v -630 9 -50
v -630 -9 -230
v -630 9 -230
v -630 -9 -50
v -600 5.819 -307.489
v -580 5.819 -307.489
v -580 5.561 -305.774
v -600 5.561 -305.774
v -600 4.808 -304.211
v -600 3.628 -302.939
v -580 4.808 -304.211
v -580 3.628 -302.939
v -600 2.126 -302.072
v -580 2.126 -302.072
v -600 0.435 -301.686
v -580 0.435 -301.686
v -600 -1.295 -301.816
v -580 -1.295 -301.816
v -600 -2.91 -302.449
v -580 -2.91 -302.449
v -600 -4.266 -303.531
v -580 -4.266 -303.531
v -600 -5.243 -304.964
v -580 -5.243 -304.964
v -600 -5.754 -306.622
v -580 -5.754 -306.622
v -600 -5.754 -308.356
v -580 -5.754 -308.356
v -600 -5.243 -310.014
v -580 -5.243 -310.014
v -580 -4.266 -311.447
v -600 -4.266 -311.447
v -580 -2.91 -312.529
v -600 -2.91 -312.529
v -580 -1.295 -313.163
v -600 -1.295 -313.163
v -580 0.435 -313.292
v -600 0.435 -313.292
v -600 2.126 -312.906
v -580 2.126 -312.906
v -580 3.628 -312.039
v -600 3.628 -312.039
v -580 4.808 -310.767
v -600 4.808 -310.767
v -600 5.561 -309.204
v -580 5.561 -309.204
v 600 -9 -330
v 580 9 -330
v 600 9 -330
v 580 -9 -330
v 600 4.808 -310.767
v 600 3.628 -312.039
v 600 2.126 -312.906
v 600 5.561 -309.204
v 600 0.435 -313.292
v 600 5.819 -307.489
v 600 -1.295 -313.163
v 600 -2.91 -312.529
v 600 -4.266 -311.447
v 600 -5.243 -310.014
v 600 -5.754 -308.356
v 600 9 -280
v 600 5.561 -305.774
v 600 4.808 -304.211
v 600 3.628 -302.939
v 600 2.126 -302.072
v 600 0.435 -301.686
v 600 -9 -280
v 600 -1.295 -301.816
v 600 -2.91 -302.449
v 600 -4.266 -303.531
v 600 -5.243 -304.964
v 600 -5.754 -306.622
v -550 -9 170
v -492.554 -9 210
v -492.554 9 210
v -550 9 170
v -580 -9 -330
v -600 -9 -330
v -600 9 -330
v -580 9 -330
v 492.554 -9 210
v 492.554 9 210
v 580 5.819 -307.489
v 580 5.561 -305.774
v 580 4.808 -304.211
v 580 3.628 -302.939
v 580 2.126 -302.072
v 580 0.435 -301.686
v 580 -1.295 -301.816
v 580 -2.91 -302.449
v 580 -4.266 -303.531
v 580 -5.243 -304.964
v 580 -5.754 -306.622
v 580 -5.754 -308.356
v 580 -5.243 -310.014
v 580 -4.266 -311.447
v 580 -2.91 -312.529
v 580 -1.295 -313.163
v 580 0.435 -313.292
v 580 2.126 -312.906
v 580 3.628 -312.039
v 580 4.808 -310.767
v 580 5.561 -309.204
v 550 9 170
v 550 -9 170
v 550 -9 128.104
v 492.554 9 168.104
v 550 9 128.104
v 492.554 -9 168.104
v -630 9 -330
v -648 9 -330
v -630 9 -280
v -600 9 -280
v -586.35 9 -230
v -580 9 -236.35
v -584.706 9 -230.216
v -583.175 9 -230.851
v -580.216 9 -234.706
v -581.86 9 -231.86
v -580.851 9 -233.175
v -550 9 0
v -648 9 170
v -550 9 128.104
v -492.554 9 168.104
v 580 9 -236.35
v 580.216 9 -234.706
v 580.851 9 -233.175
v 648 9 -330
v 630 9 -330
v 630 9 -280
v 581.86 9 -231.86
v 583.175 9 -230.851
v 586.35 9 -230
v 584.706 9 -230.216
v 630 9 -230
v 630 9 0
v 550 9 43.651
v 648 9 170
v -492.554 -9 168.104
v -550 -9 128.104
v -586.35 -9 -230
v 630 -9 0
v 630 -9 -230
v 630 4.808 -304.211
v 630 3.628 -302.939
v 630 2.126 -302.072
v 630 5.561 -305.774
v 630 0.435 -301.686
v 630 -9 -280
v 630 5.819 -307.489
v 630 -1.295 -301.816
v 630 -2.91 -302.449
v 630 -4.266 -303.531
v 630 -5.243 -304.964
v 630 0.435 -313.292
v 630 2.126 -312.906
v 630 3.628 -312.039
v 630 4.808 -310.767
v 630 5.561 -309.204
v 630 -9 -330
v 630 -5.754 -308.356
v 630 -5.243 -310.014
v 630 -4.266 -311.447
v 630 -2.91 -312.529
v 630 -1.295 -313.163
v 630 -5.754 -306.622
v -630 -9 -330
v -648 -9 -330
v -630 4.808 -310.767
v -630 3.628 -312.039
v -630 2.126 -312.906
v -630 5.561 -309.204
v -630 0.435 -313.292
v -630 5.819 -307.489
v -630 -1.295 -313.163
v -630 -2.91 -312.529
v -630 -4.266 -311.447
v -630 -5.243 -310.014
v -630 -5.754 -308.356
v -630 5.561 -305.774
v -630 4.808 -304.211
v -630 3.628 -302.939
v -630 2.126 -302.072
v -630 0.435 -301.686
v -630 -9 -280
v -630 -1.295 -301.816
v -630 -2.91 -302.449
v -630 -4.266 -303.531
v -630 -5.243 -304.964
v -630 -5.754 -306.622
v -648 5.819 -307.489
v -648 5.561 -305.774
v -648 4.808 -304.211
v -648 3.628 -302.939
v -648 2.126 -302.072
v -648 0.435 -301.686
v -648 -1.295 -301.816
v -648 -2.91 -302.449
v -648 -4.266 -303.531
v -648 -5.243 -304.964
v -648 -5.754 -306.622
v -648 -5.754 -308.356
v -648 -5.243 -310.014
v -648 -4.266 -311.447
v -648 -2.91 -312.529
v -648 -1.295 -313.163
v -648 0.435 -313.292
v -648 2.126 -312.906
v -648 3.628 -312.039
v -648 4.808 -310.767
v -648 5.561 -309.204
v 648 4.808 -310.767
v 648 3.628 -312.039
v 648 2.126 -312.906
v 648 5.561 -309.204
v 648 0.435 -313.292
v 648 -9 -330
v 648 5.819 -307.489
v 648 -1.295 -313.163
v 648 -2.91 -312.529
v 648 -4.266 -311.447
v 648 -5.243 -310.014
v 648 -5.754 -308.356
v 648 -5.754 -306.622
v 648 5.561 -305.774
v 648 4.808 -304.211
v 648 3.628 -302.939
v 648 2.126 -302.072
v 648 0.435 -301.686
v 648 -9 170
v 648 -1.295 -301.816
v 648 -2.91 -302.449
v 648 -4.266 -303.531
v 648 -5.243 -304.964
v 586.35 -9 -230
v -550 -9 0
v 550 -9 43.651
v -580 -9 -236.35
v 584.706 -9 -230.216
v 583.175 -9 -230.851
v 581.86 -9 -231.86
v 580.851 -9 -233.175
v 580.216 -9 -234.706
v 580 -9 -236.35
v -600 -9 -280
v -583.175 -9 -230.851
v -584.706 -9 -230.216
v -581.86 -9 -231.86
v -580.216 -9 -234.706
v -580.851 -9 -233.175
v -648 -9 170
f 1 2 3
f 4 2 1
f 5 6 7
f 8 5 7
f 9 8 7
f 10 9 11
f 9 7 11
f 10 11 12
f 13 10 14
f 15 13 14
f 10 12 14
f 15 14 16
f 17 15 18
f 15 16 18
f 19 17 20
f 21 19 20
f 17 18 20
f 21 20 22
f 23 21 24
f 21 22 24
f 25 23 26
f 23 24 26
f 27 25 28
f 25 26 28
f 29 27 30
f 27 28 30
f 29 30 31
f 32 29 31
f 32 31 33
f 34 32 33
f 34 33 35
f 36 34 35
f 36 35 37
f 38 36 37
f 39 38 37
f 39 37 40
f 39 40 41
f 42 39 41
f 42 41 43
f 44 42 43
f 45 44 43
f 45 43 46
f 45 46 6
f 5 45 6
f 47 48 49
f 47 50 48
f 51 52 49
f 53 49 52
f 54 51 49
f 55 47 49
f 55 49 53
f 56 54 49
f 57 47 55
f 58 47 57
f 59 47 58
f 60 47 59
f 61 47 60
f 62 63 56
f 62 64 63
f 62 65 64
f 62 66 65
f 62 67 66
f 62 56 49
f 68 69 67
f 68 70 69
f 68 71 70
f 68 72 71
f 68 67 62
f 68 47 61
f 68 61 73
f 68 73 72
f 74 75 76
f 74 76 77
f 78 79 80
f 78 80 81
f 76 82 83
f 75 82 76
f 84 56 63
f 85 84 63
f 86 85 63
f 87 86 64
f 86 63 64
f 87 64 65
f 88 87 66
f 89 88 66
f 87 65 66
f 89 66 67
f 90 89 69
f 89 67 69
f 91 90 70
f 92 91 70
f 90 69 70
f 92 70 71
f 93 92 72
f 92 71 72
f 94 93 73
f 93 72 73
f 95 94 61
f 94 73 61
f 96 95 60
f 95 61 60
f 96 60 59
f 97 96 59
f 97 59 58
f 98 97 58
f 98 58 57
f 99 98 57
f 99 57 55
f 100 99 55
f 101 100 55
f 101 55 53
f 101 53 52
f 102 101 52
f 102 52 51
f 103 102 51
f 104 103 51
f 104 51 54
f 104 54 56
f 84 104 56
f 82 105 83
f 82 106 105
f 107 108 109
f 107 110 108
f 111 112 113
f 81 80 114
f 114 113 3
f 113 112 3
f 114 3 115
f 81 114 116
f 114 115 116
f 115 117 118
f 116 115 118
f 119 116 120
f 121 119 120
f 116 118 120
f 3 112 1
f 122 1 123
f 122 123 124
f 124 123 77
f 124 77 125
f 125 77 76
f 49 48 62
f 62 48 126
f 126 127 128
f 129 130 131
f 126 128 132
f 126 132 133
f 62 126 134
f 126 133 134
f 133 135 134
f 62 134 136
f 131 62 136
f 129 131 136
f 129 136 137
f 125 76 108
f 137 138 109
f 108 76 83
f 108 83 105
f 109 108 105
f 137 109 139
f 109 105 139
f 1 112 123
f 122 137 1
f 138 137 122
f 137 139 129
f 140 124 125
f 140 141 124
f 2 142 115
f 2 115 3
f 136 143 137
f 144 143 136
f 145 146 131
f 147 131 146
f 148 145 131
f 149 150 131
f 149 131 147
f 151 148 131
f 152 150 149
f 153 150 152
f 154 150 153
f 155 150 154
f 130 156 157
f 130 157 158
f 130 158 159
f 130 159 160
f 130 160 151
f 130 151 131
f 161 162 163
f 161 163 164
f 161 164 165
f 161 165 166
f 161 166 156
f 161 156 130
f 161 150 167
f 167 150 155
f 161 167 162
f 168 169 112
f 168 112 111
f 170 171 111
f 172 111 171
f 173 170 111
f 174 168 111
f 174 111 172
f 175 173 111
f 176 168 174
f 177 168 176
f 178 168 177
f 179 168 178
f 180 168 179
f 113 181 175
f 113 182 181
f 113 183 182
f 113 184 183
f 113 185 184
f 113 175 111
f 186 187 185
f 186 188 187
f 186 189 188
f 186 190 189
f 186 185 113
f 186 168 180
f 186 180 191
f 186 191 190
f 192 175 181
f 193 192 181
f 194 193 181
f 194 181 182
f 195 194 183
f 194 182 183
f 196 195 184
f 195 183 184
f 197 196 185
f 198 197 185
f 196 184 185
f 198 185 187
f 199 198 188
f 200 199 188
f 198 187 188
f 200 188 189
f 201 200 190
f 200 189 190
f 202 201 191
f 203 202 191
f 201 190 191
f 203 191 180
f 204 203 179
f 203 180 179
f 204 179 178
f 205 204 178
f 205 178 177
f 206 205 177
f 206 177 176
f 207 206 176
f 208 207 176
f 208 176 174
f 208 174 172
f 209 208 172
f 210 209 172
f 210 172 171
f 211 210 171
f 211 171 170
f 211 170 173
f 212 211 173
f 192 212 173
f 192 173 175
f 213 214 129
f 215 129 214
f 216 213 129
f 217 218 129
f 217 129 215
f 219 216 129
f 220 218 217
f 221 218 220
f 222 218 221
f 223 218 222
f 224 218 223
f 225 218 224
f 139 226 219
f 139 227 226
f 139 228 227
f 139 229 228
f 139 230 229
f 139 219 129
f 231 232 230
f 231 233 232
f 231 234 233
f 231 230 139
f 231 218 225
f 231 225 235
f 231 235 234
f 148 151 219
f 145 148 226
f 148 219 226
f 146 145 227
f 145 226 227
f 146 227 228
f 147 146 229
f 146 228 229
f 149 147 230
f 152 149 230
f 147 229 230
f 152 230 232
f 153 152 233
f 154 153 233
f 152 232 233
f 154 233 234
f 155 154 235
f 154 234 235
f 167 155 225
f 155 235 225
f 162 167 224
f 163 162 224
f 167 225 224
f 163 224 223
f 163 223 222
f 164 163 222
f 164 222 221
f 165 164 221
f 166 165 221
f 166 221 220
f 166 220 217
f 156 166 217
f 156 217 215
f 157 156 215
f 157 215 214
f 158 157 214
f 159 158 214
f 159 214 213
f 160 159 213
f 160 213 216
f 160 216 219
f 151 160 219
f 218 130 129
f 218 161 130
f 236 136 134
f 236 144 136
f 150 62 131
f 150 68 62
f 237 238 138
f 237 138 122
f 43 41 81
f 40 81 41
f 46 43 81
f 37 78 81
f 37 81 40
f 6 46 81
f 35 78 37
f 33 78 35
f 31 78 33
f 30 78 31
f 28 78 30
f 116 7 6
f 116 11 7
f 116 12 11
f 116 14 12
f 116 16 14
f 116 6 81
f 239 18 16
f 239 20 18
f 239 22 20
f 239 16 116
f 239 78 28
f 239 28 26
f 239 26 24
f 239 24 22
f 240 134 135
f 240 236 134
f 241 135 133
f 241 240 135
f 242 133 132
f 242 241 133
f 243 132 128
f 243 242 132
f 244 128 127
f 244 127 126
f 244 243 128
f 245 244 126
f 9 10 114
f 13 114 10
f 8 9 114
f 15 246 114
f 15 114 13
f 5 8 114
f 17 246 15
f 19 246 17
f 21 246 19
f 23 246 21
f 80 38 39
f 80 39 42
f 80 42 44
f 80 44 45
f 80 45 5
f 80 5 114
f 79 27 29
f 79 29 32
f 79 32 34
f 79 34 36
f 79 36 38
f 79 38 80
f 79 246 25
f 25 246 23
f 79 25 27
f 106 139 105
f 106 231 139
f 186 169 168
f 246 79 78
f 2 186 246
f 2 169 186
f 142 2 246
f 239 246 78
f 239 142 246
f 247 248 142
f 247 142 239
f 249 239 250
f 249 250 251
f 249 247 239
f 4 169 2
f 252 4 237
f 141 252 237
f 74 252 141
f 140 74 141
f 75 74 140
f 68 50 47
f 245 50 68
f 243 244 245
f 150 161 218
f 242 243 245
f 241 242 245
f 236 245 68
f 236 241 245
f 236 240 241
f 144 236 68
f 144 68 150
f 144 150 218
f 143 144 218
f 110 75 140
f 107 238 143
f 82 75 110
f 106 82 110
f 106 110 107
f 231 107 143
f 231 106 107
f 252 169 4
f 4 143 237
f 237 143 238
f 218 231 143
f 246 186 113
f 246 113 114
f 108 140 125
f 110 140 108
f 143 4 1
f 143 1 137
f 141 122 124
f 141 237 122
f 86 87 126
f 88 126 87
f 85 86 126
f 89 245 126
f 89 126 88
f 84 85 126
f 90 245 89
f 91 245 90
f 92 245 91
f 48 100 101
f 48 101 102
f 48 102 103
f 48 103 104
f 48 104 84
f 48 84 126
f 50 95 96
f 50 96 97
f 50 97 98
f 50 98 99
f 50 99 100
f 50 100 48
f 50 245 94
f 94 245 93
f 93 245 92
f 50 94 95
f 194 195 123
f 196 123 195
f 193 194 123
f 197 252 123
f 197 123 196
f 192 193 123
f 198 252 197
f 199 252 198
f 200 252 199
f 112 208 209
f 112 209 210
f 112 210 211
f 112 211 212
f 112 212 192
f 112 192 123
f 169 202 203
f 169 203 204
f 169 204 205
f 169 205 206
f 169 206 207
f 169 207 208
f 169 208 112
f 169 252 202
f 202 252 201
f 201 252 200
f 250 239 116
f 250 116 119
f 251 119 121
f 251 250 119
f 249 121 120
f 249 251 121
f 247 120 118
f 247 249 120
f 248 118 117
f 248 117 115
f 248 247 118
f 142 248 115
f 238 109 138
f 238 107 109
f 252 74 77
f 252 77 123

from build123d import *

# Parameters (mm, degrees)
F1_DEPTH = 9
F2_R     = 5.8193233161
F3_DEPTH = 1800


# Not quite as in the source:
# - a feature names something its author has since deleted; it is built from what else it names


with BuildPart() as f1:
    # F0 (on Front) → F1 (new body, symmetric)
    with BuildSketch(Plane.XZ):
        with BuildLine():
            Line((492.5543735346, 210), (0, 210))
            Line((0, 210), (-492.5543735346, 210))
            Line((-492.5543735346, 210), (-550, 170))
            Line((-550, 170), (-630, 170))
            Line((-630, 170), (-648, 170))
            Line((-648, 170), (-648, -230))
            Line((-648, -230), (-648, -330))
            Line((-648, -330), (-630, -330))
            Line((-630, -330), (-630, -280))
            Line((-630, -280), (-600, -280))
            Line((-600, -280), (-600, -330))
            Line((-600, -330), (-580, -330))
            Line((-580, -330), (-580, -236.35))
            ThreePointArc((-580, -236.35), (-581.8598719395, -231.8598719395), (-586.35, -230))
            Line((-586.35, -230), (-630, -230))
            Line((-630, -230), (-630, -50))
            Line((-630, -50), (630, 0))
            Line((630, 0), (630, -50))
            Line((630, -50), (630, -230))
            Line((630, -230), (586.35, -230))
            ThreePointArc((586.35, -230), (581.8598719395, -231.8598719395), (580, -236.35))
            Line((580, -236.35), (580, -330))
            Line((580, -330), (600, -330))
            Line((600, -330), (600, -280))
            Line((600, -280), (630, -280))
            Line((630, -280), (630, -330))
            Line((630, -330), (648, -330))
            Line((648, -330), (648, -230))
            Line((648, -230), (648, 170))
            Line((648, 170), (630, 170))
            Line((630, 170), (550, 170))
            Line((550, 170), (492.5543735346, 210))
        make_face()
        Polygon((550, 43.6507936508), (-550, 0), (-550, 128.1044334173), (-492.5543735346, 168.1044334173), (492.5543735346, 168.1044334173), (550, 128.1044334173), align=None, mode=Mode.SUBTRACT)
    extrude(amount=F1_DEPTH, both=True)

    # F2 (on face) → F3 (cut)
    with BuildSketch(Plane.YZ.offset(648)):
        with Locations((0, -307.489156723)):
            Circle(F2_R)
    extrude(amount=-F3_DEPTH, mode=Mode.SUBTRACT)


solid = f1.part
